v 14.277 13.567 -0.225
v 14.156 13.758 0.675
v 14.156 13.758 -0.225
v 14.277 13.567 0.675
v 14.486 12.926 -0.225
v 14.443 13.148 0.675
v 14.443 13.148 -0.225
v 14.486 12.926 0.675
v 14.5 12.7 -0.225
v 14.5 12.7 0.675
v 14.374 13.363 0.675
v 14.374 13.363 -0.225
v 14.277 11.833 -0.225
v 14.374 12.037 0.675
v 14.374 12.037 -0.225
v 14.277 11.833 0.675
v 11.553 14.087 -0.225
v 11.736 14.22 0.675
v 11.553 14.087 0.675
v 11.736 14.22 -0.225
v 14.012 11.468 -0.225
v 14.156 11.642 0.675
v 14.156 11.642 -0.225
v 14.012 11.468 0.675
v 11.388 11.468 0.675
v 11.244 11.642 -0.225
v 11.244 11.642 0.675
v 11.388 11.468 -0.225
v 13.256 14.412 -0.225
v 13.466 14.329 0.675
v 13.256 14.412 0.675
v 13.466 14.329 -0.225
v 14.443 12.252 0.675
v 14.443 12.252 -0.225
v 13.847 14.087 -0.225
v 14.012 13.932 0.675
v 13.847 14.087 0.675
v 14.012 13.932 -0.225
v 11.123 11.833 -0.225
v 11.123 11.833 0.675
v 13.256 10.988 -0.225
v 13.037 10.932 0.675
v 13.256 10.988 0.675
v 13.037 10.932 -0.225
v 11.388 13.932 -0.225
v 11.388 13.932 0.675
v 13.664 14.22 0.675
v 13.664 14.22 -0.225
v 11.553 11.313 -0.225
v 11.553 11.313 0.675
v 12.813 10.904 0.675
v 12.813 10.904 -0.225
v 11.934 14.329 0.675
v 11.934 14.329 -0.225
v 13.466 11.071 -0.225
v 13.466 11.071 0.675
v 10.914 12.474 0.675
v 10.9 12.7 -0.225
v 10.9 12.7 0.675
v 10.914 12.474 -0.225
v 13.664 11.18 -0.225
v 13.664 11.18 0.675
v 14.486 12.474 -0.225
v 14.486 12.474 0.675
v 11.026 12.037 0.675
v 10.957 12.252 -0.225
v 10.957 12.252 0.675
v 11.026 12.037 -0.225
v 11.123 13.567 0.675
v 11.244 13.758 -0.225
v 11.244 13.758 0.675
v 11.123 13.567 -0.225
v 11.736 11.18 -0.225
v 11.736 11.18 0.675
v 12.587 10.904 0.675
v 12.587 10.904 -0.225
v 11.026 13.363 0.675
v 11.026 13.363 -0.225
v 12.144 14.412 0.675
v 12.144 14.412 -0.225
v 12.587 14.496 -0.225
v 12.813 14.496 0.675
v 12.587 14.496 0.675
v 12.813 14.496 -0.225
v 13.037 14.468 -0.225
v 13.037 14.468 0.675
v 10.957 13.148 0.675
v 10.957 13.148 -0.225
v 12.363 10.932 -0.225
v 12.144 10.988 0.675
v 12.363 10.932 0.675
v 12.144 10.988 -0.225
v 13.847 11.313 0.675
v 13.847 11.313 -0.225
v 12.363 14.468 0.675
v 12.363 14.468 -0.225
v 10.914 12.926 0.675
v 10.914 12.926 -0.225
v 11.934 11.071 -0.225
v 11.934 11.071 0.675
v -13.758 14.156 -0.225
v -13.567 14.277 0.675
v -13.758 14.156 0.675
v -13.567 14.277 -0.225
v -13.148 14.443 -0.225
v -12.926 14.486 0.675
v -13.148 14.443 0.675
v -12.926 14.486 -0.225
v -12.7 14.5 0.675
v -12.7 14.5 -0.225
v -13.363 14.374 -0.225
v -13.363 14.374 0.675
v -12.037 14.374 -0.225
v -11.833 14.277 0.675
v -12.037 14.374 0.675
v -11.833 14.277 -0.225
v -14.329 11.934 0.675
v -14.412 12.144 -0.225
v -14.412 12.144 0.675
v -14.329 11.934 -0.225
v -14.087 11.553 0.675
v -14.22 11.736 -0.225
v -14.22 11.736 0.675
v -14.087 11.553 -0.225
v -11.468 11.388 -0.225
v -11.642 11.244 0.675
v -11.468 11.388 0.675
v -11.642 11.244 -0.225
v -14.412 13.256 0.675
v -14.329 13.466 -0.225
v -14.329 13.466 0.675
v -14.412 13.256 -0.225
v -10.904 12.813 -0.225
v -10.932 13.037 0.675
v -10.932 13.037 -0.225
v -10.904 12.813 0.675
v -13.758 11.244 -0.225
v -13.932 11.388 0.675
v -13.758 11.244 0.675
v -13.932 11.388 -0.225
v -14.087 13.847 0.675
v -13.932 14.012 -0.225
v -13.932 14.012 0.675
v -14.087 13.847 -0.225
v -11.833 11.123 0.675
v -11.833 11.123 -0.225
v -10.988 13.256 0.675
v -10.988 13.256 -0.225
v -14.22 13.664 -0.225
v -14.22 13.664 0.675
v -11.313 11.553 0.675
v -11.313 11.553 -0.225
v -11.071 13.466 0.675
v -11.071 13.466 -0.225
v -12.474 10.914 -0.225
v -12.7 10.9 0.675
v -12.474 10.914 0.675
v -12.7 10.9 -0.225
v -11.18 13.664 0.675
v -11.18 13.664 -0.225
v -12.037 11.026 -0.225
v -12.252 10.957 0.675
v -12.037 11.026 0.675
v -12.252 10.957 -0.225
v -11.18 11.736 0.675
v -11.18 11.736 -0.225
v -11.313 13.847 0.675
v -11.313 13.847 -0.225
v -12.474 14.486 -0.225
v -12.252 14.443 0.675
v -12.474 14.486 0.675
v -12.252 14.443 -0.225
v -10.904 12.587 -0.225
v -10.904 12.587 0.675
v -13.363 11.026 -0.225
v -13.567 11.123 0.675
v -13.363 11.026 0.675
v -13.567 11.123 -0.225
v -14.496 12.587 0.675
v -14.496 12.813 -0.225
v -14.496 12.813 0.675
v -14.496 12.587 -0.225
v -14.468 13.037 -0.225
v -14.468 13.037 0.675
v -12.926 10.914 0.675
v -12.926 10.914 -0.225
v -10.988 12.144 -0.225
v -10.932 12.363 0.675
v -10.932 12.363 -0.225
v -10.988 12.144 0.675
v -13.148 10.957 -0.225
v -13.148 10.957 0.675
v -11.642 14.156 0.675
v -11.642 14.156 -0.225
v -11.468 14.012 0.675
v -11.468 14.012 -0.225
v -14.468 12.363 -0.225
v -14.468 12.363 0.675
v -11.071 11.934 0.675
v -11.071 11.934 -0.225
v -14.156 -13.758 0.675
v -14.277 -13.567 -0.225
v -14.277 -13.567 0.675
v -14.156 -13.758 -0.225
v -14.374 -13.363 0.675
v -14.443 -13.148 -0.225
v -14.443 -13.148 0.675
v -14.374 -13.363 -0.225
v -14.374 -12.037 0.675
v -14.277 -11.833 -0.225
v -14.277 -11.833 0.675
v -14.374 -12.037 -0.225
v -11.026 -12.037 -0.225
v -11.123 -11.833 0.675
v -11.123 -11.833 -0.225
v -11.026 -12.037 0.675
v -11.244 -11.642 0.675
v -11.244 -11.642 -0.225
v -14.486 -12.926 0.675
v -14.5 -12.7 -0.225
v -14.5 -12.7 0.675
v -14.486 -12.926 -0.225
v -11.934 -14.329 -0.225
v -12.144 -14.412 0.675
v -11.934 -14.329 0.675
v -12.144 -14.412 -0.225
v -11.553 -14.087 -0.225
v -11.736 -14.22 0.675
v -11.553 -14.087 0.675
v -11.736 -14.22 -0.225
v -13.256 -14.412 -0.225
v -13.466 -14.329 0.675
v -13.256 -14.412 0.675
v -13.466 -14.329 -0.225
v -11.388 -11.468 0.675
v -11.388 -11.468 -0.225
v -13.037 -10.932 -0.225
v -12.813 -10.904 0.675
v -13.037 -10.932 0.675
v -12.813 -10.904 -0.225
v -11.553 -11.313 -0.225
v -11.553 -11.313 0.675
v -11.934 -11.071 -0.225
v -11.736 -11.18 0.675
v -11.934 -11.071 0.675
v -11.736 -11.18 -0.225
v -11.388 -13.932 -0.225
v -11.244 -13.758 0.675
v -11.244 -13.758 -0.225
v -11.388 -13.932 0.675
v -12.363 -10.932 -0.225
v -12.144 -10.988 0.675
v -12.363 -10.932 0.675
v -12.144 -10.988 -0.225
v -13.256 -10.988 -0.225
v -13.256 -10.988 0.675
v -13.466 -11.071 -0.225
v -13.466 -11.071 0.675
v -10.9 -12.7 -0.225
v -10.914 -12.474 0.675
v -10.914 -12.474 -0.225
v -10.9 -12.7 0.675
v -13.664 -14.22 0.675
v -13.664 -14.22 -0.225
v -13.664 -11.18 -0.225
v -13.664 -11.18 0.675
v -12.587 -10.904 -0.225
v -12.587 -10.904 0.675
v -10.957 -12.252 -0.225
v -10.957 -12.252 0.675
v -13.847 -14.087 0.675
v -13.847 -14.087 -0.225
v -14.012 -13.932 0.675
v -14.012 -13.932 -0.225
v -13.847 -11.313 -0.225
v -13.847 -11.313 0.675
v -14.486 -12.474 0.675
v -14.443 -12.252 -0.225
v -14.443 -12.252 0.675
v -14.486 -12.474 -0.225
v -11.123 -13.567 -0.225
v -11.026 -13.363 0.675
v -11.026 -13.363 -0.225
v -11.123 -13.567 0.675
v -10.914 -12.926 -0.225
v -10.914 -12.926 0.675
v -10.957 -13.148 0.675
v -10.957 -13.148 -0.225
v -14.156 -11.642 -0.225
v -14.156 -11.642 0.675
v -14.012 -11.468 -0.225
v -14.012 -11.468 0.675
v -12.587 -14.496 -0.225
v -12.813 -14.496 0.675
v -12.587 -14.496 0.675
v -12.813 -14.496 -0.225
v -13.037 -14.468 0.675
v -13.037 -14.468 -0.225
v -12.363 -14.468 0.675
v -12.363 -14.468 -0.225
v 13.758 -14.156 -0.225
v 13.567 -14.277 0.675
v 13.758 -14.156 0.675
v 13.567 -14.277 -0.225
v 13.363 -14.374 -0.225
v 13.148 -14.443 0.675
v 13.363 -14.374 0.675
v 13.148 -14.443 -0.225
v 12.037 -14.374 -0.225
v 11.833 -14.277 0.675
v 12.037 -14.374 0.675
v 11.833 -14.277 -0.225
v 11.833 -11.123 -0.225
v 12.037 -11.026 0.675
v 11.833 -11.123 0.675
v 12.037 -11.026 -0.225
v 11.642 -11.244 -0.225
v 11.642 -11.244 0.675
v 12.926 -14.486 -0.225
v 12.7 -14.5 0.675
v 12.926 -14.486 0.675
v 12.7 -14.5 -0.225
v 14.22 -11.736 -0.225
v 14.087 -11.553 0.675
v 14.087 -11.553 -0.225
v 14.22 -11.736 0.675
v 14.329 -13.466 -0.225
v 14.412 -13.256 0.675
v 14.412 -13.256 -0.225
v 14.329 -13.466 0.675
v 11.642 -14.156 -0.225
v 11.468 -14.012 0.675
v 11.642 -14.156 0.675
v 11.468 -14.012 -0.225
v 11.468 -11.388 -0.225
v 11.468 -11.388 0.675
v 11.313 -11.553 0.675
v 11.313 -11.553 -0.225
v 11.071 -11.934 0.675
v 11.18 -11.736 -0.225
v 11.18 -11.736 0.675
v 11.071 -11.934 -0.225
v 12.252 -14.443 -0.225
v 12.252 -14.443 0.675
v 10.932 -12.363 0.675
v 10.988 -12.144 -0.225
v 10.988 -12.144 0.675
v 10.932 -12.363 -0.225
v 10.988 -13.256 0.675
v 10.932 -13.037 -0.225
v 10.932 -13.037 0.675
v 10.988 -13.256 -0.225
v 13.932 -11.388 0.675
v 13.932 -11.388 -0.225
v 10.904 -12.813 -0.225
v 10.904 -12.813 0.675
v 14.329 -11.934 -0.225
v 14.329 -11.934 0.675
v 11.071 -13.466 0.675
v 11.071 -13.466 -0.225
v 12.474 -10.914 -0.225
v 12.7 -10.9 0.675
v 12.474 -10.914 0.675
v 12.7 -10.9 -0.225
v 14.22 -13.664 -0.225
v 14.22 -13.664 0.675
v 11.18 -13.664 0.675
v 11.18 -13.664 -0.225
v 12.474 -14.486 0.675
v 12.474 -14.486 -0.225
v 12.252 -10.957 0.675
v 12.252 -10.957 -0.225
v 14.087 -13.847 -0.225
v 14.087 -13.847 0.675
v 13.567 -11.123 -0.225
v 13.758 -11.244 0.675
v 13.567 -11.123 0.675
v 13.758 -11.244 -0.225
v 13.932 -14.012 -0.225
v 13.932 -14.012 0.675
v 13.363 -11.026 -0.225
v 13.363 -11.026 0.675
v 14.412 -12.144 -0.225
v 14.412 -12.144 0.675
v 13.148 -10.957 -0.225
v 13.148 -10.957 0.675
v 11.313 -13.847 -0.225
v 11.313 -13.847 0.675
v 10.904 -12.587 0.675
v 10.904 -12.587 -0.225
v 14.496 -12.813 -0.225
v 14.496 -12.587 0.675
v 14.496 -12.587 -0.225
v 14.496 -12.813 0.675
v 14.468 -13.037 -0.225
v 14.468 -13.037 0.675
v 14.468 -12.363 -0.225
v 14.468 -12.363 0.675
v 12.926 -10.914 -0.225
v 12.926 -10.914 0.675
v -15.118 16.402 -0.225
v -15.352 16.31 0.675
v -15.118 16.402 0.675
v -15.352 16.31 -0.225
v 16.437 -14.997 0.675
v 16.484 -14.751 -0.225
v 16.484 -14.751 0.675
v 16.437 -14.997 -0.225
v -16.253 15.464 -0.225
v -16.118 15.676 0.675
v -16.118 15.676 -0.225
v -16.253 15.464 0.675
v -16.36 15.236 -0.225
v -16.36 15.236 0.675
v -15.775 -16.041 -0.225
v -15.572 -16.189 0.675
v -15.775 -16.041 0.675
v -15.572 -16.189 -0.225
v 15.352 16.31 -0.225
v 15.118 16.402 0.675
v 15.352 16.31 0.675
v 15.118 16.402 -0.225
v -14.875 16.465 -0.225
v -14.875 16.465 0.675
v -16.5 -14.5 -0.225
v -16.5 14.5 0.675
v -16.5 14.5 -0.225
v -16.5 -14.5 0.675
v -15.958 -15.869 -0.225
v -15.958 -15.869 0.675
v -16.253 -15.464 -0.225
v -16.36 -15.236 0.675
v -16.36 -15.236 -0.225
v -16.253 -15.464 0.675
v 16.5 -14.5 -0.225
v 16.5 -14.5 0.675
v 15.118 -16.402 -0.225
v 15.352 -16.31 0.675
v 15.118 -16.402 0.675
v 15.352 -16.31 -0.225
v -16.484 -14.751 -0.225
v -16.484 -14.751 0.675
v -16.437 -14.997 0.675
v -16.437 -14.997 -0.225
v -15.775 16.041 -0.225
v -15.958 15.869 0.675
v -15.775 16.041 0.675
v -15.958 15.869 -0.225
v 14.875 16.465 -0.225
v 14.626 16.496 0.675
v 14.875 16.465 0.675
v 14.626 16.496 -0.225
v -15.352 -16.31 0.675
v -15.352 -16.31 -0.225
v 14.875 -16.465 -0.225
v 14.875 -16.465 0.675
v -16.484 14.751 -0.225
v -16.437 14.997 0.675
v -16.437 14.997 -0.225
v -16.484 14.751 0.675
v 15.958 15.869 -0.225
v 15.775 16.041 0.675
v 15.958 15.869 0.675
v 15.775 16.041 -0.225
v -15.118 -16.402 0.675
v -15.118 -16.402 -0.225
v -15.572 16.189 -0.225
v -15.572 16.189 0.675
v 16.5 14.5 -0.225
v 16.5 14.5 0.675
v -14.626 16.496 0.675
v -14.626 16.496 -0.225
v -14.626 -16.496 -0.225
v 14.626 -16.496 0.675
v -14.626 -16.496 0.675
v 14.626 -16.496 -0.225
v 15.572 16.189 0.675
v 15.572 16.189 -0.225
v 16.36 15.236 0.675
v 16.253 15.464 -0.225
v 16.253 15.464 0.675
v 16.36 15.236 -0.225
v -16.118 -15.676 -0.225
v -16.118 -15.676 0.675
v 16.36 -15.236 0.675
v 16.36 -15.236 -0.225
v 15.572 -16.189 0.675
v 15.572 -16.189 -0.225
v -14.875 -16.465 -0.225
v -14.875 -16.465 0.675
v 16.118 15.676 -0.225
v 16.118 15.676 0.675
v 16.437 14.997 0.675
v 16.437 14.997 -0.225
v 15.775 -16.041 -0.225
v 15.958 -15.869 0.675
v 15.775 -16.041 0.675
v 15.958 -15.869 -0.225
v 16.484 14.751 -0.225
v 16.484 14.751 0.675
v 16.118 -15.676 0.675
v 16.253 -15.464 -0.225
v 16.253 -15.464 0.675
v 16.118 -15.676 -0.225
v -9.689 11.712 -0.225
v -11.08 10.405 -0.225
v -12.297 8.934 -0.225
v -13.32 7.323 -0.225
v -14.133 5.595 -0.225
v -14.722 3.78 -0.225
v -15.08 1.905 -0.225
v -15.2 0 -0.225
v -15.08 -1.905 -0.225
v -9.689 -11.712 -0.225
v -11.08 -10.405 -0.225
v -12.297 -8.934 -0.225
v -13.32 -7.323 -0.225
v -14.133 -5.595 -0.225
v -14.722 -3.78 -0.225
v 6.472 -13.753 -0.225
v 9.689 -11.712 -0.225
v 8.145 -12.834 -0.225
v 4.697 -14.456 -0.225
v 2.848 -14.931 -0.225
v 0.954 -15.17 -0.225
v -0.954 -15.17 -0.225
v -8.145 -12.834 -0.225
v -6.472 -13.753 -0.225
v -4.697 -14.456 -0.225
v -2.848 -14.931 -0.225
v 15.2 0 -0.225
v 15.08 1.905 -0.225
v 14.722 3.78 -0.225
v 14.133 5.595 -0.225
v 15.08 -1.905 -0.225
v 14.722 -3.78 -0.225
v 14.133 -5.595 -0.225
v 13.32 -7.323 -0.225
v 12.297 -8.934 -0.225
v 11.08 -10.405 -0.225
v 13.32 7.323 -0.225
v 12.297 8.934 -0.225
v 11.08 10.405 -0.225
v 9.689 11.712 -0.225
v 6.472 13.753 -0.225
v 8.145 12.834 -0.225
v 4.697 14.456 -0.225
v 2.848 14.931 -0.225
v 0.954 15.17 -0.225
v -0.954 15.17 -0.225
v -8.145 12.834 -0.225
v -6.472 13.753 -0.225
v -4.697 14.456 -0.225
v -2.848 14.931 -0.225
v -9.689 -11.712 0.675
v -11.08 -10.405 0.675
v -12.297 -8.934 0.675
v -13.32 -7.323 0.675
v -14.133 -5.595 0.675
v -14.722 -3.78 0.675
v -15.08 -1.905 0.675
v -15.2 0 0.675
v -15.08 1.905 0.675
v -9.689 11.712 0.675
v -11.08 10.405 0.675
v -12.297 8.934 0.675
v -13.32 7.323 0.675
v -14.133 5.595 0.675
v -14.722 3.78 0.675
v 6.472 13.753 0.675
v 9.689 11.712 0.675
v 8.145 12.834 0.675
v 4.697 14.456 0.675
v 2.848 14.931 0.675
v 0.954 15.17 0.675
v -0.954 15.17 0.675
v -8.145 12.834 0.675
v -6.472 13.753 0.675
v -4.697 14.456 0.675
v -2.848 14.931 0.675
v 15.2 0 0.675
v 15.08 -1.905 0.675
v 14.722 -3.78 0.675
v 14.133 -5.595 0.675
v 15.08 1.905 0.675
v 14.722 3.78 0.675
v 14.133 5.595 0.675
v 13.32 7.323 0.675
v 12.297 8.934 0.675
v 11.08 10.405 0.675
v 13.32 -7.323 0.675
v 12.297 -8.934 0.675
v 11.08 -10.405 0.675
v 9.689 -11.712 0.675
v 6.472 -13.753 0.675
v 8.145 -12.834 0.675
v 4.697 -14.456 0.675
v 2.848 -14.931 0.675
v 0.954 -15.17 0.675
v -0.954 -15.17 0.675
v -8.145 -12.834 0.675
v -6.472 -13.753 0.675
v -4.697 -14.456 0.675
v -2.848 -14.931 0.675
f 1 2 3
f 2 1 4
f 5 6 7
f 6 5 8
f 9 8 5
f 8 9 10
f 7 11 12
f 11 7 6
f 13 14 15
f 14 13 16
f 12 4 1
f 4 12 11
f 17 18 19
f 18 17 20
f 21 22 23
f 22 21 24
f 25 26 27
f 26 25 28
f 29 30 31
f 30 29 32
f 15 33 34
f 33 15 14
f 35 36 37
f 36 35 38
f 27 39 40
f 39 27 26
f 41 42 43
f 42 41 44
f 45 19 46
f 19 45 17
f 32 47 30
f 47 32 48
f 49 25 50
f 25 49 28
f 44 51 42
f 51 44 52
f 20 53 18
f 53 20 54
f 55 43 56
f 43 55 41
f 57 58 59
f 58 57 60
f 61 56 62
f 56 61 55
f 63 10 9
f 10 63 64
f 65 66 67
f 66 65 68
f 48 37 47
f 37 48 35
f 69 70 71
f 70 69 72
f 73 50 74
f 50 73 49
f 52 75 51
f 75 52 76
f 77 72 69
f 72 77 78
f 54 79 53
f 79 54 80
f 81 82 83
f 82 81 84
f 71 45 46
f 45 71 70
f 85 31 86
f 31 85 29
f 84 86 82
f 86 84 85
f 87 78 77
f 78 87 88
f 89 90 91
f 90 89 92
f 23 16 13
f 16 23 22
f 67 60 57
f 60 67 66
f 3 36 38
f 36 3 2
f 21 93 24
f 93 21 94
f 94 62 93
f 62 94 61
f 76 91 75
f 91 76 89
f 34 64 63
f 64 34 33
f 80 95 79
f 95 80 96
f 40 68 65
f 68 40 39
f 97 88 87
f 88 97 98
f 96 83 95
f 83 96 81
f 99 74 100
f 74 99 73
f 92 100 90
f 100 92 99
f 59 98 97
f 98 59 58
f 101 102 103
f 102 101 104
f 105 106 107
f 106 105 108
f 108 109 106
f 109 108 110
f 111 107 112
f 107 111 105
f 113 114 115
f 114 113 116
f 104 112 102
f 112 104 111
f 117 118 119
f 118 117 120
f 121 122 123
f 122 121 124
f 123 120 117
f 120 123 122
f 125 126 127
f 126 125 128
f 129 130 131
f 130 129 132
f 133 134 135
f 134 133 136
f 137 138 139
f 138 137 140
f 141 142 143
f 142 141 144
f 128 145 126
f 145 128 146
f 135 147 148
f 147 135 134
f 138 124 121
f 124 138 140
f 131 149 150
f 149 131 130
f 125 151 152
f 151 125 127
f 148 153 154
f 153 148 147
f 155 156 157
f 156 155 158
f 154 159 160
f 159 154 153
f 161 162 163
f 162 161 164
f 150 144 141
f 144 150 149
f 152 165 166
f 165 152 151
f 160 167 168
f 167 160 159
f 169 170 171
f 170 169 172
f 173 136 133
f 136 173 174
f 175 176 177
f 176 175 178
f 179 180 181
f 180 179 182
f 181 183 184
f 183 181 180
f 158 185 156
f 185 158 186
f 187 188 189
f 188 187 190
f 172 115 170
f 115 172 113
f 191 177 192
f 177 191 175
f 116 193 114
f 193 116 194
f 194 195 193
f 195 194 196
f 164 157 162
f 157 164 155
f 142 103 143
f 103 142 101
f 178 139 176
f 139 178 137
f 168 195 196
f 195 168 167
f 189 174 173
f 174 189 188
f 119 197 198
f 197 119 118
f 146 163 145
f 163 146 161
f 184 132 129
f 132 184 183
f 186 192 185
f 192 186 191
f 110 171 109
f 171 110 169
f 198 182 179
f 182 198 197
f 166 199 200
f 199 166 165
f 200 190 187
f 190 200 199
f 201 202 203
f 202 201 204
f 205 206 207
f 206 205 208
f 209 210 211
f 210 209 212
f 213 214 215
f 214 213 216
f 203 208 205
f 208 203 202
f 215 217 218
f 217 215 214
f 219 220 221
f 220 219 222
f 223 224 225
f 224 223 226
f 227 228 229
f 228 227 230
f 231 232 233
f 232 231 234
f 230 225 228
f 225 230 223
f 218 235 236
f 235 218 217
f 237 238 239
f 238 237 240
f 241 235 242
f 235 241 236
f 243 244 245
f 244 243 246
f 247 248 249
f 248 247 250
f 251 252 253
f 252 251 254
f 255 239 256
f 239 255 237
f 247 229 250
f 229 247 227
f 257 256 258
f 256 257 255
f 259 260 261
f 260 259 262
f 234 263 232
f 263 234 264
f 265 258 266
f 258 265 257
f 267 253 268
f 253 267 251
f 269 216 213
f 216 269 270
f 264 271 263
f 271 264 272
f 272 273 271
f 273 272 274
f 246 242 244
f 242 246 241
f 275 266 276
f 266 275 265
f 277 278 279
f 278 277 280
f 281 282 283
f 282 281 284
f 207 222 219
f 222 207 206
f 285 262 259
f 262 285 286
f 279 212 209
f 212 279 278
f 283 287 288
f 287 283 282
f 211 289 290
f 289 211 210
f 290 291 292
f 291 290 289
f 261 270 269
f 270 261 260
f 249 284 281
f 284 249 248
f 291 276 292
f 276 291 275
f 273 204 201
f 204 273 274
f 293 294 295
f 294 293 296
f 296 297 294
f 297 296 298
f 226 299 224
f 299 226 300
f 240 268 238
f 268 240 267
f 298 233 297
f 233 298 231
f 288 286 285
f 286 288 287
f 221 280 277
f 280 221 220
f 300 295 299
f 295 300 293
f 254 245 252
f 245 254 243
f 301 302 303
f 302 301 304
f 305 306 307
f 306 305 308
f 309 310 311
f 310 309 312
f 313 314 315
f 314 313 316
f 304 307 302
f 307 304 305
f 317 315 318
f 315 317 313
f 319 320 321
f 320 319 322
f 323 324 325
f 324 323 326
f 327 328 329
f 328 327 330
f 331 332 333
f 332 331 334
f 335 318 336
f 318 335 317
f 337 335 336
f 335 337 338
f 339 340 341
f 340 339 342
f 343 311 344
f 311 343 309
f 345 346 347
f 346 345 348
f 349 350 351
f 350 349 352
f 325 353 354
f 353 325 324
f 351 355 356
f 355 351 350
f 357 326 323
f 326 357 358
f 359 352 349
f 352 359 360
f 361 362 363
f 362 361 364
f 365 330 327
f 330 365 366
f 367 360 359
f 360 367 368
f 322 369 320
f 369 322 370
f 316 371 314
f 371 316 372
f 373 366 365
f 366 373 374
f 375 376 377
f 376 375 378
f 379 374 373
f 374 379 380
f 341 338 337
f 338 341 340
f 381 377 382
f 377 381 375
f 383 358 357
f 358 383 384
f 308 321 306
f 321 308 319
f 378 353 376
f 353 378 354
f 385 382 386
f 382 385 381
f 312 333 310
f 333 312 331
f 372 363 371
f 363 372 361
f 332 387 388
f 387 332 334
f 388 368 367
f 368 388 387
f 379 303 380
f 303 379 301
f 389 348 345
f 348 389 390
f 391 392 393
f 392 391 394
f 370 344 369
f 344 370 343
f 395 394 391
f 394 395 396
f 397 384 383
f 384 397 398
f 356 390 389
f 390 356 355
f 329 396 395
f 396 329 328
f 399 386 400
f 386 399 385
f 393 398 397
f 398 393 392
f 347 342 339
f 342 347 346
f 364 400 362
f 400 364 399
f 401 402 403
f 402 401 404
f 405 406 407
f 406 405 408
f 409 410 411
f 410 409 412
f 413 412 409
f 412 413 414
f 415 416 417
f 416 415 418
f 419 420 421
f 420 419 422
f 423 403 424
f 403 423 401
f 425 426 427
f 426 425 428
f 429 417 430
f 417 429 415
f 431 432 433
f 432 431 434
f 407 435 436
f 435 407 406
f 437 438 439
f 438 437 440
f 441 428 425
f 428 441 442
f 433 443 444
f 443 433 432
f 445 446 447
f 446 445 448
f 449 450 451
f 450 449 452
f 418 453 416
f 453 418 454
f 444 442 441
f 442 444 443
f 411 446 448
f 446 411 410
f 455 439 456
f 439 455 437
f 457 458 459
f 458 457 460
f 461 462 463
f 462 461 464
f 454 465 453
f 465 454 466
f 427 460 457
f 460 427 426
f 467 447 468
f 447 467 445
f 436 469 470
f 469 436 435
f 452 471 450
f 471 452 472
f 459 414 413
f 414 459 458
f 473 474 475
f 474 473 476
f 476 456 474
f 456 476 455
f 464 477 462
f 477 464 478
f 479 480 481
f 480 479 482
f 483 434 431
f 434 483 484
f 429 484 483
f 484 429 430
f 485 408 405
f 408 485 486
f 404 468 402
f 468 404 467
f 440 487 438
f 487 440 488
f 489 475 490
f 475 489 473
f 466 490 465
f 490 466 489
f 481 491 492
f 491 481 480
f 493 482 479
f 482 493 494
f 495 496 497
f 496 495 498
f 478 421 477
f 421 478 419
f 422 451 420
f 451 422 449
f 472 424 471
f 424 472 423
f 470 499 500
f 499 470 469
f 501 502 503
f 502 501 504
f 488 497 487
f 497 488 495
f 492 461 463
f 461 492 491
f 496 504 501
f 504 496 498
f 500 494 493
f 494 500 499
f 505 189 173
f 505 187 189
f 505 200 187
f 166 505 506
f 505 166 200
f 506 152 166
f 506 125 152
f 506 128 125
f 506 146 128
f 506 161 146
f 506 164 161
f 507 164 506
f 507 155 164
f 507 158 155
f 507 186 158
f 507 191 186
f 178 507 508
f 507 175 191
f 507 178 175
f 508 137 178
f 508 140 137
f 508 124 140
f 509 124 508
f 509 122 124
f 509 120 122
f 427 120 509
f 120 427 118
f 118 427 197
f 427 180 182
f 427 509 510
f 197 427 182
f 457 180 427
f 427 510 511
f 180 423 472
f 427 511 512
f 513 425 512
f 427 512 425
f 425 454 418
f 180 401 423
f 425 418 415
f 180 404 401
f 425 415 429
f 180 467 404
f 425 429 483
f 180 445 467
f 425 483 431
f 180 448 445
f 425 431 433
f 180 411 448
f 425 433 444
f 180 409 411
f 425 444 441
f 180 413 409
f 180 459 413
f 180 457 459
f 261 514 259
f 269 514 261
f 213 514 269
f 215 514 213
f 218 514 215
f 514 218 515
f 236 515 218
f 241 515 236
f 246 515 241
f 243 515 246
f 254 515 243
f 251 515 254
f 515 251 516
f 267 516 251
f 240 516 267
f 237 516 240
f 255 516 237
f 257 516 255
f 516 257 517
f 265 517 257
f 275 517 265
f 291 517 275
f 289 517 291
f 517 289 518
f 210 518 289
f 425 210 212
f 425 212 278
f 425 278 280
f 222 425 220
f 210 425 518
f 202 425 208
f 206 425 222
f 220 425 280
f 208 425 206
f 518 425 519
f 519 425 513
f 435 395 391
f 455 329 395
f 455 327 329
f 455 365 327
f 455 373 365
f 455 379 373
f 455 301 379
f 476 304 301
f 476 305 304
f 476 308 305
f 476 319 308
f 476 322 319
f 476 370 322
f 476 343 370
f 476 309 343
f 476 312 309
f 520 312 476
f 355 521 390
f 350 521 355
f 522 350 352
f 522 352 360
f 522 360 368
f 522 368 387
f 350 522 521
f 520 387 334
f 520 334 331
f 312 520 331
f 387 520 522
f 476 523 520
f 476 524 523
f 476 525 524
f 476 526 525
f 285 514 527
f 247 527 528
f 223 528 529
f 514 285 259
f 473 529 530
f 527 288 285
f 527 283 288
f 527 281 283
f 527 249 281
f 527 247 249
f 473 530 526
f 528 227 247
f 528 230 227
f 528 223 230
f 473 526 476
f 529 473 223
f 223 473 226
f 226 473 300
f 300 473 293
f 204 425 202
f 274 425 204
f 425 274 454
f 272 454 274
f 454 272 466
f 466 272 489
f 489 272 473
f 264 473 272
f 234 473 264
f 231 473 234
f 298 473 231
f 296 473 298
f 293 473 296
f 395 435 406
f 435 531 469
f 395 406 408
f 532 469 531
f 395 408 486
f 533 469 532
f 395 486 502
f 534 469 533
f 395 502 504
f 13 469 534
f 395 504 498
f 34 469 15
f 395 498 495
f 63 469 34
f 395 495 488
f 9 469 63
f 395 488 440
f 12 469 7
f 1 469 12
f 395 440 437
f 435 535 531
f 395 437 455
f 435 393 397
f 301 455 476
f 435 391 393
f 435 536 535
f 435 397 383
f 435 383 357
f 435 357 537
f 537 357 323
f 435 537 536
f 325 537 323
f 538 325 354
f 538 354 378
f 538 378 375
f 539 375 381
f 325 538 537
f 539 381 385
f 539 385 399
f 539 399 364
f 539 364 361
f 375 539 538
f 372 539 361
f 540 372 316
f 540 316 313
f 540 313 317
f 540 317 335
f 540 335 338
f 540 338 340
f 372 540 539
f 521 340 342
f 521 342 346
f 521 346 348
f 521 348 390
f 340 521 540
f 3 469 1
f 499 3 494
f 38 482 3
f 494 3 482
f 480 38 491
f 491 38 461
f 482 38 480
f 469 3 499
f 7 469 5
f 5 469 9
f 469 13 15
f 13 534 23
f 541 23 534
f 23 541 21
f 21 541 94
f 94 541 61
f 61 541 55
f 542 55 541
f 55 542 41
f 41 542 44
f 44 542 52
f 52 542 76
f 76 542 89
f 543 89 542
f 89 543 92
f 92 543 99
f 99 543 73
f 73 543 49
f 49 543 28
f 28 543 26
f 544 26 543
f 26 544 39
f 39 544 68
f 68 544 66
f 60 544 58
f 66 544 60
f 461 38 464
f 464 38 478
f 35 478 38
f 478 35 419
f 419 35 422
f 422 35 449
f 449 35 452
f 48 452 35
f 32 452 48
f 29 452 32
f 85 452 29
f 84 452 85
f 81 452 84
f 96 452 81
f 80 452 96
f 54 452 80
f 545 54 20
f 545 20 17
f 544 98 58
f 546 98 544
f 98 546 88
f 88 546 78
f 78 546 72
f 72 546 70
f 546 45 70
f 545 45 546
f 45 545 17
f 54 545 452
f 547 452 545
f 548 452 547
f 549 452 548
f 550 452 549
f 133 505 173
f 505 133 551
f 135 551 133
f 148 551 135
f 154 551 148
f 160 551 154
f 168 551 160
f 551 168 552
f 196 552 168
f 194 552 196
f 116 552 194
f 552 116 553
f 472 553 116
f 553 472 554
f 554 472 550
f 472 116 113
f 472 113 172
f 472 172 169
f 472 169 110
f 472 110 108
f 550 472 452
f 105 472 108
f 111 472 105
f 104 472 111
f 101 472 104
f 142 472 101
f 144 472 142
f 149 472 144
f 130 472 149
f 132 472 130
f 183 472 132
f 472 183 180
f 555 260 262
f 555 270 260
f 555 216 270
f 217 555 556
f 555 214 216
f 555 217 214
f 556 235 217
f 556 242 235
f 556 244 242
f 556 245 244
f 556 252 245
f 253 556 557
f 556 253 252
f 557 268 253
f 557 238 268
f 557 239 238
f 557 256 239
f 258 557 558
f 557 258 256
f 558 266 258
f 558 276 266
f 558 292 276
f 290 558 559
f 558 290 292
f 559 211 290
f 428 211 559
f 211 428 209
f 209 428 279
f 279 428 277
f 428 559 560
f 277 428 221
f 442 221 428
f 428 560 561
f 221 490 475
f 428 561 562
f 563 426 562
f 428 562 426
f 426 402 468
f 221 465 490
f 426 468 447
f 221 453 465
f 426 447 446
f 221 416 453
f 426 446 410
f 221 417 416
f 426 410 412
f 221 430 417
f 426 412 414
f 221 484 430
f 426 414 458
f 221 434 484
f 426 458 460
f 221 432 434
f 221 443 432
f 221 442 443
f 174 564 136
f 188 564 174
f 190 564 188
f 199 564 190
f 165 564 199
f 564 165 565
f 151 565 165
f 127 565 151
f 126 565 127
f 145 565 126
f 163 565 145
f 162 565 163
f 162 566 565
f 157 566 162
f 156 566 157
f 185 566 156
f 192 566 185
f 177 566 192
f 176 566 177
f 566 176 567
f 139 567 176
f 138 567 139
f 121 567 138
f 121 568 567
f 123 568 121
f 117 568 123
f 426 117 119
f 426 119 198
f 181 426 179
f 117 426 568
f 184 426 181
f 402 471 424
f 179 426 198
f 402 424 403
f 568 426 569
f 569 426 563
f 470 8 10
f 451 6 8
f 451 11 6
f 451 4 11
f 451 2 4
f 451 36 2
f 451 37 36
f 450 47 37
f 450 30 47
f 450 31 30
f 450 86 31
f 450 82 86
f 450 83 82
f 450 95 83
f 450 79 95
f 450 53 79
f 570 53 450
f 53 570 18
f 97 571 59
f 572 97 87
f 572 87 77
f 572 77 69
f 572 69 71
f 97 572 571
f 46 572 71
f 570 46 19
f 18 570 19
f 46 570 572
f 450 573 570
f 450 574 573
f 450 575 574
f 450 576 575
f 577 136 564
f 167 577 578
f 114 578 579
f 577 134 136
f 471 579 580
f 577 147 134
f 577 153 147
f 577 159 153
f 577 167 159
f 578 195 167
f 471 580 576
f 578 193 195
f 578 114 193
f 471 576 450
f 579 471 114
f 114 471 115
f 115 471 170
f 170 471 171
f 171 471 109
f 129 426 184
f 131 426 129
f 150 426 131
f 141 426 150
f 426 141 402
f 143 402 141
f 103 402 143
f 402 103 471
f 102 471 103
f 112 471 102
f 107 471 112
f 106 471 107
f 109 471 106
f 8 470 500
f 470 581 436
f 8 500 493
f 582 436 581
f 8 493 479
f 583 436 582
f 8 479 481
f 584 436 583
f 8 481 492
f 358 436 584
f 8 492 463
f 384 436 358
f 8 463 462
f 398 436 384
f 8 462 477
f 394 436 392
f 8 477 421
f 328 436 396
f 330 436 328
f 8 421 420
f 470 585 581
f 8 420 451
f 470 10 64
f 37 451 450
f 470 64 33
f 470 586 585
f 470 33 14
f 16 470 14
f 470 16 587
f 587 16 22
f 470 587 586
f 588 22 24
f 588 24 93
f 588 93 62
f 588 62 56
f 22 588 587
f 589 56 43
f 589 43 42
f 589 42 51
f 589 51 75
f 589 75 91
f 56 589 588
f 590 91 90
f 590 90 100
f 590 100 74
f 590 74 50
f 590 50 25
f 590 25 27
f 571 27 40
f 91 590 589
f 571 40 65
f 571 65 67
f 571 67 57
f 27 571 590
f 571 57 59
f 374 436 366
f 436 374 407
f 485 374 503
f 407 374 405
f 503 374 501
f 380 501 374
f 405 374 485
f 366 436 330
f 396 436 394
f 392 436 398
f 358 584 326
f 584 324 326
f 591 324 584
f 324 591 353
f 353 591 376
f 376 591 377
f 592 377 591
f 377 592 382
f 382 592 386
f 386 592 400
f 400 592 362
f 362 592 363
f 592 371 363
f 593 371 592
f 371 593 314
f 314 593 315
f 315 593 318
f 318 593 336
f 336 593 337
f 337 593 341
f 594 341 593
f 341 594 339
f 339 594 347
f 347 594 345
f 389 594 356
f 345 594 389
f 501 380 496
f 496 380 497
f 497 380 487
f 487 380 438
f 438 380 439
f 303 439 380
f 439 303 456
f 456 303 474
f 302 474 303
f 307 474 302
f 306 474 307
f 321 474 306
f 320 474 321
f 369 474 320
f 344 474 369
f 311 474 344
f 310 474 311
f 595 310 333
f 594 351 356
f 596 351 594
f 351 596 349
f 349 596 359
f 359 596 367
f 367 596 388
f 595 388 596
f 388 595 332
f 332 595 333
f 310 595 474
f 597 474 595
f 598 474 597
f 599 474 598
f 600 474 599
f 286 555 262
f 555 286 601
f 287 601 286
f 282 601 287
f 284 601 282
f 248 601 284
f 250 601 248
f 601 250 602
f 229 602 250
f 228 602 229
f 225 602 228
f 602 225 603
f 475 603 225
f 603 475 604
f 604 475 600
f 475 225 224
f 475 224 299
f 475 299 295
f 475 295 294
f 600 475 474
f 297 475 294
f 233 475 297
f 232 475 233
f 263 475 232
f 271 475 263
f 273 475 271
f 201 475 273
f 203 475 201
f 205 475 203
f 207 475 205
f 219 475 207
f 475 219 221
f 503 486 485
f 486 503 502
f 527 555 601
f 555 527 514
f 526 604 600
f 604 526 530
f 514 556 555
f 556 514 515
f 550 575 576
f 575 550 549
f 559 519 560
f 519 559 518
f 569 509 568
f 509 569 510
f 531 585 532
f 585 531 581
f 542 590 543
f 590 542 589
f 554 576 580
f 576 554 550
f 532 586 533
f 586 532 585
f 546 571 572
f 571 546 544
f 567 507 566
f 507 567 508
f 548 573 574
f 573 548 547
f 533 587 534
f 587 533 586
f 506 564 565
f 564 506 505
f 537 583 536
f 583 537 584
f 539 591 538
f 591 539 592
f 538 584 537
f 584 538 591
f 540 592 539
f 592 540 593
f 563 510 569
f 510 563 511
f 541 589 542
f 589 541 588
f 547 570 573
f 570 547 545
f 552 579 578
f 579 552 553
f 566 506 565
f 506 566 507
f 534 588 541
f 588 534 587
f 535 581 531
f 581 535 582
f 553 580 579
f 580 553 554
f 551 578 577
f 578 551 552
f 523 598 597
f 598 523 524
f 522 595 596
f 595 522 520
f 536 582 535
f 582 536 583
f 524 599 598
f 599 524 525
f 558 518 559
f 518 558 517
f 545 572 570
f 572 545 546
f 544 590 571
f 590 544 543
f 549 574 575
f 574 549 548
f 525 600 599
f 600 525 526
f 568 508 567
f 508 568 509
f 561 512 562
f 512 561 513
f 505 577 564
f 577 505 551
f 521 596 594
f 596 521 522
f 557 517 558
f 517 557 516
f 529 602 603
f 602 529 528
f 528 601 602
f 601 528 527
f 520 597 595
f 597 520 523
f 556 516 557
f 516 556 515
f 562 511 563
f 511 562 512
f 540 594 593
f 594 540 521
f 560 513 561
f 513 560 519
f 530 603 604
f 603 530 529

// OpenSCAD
$fn=50;
dist=12.7;
difference() {
    minkowski()
    {
        cube([29,29,0.45], center = true);
        cylinder(r=2,h=0.45);
    }
    for(step = [0, 90, 180, 270]){
        rotate(step){
            translate([dist,dist,-0.3]){
                cylinder(r=1.8,h=1);
            }
        }
    }

    cylinder(r=15.2,h=2, center = true);
}
